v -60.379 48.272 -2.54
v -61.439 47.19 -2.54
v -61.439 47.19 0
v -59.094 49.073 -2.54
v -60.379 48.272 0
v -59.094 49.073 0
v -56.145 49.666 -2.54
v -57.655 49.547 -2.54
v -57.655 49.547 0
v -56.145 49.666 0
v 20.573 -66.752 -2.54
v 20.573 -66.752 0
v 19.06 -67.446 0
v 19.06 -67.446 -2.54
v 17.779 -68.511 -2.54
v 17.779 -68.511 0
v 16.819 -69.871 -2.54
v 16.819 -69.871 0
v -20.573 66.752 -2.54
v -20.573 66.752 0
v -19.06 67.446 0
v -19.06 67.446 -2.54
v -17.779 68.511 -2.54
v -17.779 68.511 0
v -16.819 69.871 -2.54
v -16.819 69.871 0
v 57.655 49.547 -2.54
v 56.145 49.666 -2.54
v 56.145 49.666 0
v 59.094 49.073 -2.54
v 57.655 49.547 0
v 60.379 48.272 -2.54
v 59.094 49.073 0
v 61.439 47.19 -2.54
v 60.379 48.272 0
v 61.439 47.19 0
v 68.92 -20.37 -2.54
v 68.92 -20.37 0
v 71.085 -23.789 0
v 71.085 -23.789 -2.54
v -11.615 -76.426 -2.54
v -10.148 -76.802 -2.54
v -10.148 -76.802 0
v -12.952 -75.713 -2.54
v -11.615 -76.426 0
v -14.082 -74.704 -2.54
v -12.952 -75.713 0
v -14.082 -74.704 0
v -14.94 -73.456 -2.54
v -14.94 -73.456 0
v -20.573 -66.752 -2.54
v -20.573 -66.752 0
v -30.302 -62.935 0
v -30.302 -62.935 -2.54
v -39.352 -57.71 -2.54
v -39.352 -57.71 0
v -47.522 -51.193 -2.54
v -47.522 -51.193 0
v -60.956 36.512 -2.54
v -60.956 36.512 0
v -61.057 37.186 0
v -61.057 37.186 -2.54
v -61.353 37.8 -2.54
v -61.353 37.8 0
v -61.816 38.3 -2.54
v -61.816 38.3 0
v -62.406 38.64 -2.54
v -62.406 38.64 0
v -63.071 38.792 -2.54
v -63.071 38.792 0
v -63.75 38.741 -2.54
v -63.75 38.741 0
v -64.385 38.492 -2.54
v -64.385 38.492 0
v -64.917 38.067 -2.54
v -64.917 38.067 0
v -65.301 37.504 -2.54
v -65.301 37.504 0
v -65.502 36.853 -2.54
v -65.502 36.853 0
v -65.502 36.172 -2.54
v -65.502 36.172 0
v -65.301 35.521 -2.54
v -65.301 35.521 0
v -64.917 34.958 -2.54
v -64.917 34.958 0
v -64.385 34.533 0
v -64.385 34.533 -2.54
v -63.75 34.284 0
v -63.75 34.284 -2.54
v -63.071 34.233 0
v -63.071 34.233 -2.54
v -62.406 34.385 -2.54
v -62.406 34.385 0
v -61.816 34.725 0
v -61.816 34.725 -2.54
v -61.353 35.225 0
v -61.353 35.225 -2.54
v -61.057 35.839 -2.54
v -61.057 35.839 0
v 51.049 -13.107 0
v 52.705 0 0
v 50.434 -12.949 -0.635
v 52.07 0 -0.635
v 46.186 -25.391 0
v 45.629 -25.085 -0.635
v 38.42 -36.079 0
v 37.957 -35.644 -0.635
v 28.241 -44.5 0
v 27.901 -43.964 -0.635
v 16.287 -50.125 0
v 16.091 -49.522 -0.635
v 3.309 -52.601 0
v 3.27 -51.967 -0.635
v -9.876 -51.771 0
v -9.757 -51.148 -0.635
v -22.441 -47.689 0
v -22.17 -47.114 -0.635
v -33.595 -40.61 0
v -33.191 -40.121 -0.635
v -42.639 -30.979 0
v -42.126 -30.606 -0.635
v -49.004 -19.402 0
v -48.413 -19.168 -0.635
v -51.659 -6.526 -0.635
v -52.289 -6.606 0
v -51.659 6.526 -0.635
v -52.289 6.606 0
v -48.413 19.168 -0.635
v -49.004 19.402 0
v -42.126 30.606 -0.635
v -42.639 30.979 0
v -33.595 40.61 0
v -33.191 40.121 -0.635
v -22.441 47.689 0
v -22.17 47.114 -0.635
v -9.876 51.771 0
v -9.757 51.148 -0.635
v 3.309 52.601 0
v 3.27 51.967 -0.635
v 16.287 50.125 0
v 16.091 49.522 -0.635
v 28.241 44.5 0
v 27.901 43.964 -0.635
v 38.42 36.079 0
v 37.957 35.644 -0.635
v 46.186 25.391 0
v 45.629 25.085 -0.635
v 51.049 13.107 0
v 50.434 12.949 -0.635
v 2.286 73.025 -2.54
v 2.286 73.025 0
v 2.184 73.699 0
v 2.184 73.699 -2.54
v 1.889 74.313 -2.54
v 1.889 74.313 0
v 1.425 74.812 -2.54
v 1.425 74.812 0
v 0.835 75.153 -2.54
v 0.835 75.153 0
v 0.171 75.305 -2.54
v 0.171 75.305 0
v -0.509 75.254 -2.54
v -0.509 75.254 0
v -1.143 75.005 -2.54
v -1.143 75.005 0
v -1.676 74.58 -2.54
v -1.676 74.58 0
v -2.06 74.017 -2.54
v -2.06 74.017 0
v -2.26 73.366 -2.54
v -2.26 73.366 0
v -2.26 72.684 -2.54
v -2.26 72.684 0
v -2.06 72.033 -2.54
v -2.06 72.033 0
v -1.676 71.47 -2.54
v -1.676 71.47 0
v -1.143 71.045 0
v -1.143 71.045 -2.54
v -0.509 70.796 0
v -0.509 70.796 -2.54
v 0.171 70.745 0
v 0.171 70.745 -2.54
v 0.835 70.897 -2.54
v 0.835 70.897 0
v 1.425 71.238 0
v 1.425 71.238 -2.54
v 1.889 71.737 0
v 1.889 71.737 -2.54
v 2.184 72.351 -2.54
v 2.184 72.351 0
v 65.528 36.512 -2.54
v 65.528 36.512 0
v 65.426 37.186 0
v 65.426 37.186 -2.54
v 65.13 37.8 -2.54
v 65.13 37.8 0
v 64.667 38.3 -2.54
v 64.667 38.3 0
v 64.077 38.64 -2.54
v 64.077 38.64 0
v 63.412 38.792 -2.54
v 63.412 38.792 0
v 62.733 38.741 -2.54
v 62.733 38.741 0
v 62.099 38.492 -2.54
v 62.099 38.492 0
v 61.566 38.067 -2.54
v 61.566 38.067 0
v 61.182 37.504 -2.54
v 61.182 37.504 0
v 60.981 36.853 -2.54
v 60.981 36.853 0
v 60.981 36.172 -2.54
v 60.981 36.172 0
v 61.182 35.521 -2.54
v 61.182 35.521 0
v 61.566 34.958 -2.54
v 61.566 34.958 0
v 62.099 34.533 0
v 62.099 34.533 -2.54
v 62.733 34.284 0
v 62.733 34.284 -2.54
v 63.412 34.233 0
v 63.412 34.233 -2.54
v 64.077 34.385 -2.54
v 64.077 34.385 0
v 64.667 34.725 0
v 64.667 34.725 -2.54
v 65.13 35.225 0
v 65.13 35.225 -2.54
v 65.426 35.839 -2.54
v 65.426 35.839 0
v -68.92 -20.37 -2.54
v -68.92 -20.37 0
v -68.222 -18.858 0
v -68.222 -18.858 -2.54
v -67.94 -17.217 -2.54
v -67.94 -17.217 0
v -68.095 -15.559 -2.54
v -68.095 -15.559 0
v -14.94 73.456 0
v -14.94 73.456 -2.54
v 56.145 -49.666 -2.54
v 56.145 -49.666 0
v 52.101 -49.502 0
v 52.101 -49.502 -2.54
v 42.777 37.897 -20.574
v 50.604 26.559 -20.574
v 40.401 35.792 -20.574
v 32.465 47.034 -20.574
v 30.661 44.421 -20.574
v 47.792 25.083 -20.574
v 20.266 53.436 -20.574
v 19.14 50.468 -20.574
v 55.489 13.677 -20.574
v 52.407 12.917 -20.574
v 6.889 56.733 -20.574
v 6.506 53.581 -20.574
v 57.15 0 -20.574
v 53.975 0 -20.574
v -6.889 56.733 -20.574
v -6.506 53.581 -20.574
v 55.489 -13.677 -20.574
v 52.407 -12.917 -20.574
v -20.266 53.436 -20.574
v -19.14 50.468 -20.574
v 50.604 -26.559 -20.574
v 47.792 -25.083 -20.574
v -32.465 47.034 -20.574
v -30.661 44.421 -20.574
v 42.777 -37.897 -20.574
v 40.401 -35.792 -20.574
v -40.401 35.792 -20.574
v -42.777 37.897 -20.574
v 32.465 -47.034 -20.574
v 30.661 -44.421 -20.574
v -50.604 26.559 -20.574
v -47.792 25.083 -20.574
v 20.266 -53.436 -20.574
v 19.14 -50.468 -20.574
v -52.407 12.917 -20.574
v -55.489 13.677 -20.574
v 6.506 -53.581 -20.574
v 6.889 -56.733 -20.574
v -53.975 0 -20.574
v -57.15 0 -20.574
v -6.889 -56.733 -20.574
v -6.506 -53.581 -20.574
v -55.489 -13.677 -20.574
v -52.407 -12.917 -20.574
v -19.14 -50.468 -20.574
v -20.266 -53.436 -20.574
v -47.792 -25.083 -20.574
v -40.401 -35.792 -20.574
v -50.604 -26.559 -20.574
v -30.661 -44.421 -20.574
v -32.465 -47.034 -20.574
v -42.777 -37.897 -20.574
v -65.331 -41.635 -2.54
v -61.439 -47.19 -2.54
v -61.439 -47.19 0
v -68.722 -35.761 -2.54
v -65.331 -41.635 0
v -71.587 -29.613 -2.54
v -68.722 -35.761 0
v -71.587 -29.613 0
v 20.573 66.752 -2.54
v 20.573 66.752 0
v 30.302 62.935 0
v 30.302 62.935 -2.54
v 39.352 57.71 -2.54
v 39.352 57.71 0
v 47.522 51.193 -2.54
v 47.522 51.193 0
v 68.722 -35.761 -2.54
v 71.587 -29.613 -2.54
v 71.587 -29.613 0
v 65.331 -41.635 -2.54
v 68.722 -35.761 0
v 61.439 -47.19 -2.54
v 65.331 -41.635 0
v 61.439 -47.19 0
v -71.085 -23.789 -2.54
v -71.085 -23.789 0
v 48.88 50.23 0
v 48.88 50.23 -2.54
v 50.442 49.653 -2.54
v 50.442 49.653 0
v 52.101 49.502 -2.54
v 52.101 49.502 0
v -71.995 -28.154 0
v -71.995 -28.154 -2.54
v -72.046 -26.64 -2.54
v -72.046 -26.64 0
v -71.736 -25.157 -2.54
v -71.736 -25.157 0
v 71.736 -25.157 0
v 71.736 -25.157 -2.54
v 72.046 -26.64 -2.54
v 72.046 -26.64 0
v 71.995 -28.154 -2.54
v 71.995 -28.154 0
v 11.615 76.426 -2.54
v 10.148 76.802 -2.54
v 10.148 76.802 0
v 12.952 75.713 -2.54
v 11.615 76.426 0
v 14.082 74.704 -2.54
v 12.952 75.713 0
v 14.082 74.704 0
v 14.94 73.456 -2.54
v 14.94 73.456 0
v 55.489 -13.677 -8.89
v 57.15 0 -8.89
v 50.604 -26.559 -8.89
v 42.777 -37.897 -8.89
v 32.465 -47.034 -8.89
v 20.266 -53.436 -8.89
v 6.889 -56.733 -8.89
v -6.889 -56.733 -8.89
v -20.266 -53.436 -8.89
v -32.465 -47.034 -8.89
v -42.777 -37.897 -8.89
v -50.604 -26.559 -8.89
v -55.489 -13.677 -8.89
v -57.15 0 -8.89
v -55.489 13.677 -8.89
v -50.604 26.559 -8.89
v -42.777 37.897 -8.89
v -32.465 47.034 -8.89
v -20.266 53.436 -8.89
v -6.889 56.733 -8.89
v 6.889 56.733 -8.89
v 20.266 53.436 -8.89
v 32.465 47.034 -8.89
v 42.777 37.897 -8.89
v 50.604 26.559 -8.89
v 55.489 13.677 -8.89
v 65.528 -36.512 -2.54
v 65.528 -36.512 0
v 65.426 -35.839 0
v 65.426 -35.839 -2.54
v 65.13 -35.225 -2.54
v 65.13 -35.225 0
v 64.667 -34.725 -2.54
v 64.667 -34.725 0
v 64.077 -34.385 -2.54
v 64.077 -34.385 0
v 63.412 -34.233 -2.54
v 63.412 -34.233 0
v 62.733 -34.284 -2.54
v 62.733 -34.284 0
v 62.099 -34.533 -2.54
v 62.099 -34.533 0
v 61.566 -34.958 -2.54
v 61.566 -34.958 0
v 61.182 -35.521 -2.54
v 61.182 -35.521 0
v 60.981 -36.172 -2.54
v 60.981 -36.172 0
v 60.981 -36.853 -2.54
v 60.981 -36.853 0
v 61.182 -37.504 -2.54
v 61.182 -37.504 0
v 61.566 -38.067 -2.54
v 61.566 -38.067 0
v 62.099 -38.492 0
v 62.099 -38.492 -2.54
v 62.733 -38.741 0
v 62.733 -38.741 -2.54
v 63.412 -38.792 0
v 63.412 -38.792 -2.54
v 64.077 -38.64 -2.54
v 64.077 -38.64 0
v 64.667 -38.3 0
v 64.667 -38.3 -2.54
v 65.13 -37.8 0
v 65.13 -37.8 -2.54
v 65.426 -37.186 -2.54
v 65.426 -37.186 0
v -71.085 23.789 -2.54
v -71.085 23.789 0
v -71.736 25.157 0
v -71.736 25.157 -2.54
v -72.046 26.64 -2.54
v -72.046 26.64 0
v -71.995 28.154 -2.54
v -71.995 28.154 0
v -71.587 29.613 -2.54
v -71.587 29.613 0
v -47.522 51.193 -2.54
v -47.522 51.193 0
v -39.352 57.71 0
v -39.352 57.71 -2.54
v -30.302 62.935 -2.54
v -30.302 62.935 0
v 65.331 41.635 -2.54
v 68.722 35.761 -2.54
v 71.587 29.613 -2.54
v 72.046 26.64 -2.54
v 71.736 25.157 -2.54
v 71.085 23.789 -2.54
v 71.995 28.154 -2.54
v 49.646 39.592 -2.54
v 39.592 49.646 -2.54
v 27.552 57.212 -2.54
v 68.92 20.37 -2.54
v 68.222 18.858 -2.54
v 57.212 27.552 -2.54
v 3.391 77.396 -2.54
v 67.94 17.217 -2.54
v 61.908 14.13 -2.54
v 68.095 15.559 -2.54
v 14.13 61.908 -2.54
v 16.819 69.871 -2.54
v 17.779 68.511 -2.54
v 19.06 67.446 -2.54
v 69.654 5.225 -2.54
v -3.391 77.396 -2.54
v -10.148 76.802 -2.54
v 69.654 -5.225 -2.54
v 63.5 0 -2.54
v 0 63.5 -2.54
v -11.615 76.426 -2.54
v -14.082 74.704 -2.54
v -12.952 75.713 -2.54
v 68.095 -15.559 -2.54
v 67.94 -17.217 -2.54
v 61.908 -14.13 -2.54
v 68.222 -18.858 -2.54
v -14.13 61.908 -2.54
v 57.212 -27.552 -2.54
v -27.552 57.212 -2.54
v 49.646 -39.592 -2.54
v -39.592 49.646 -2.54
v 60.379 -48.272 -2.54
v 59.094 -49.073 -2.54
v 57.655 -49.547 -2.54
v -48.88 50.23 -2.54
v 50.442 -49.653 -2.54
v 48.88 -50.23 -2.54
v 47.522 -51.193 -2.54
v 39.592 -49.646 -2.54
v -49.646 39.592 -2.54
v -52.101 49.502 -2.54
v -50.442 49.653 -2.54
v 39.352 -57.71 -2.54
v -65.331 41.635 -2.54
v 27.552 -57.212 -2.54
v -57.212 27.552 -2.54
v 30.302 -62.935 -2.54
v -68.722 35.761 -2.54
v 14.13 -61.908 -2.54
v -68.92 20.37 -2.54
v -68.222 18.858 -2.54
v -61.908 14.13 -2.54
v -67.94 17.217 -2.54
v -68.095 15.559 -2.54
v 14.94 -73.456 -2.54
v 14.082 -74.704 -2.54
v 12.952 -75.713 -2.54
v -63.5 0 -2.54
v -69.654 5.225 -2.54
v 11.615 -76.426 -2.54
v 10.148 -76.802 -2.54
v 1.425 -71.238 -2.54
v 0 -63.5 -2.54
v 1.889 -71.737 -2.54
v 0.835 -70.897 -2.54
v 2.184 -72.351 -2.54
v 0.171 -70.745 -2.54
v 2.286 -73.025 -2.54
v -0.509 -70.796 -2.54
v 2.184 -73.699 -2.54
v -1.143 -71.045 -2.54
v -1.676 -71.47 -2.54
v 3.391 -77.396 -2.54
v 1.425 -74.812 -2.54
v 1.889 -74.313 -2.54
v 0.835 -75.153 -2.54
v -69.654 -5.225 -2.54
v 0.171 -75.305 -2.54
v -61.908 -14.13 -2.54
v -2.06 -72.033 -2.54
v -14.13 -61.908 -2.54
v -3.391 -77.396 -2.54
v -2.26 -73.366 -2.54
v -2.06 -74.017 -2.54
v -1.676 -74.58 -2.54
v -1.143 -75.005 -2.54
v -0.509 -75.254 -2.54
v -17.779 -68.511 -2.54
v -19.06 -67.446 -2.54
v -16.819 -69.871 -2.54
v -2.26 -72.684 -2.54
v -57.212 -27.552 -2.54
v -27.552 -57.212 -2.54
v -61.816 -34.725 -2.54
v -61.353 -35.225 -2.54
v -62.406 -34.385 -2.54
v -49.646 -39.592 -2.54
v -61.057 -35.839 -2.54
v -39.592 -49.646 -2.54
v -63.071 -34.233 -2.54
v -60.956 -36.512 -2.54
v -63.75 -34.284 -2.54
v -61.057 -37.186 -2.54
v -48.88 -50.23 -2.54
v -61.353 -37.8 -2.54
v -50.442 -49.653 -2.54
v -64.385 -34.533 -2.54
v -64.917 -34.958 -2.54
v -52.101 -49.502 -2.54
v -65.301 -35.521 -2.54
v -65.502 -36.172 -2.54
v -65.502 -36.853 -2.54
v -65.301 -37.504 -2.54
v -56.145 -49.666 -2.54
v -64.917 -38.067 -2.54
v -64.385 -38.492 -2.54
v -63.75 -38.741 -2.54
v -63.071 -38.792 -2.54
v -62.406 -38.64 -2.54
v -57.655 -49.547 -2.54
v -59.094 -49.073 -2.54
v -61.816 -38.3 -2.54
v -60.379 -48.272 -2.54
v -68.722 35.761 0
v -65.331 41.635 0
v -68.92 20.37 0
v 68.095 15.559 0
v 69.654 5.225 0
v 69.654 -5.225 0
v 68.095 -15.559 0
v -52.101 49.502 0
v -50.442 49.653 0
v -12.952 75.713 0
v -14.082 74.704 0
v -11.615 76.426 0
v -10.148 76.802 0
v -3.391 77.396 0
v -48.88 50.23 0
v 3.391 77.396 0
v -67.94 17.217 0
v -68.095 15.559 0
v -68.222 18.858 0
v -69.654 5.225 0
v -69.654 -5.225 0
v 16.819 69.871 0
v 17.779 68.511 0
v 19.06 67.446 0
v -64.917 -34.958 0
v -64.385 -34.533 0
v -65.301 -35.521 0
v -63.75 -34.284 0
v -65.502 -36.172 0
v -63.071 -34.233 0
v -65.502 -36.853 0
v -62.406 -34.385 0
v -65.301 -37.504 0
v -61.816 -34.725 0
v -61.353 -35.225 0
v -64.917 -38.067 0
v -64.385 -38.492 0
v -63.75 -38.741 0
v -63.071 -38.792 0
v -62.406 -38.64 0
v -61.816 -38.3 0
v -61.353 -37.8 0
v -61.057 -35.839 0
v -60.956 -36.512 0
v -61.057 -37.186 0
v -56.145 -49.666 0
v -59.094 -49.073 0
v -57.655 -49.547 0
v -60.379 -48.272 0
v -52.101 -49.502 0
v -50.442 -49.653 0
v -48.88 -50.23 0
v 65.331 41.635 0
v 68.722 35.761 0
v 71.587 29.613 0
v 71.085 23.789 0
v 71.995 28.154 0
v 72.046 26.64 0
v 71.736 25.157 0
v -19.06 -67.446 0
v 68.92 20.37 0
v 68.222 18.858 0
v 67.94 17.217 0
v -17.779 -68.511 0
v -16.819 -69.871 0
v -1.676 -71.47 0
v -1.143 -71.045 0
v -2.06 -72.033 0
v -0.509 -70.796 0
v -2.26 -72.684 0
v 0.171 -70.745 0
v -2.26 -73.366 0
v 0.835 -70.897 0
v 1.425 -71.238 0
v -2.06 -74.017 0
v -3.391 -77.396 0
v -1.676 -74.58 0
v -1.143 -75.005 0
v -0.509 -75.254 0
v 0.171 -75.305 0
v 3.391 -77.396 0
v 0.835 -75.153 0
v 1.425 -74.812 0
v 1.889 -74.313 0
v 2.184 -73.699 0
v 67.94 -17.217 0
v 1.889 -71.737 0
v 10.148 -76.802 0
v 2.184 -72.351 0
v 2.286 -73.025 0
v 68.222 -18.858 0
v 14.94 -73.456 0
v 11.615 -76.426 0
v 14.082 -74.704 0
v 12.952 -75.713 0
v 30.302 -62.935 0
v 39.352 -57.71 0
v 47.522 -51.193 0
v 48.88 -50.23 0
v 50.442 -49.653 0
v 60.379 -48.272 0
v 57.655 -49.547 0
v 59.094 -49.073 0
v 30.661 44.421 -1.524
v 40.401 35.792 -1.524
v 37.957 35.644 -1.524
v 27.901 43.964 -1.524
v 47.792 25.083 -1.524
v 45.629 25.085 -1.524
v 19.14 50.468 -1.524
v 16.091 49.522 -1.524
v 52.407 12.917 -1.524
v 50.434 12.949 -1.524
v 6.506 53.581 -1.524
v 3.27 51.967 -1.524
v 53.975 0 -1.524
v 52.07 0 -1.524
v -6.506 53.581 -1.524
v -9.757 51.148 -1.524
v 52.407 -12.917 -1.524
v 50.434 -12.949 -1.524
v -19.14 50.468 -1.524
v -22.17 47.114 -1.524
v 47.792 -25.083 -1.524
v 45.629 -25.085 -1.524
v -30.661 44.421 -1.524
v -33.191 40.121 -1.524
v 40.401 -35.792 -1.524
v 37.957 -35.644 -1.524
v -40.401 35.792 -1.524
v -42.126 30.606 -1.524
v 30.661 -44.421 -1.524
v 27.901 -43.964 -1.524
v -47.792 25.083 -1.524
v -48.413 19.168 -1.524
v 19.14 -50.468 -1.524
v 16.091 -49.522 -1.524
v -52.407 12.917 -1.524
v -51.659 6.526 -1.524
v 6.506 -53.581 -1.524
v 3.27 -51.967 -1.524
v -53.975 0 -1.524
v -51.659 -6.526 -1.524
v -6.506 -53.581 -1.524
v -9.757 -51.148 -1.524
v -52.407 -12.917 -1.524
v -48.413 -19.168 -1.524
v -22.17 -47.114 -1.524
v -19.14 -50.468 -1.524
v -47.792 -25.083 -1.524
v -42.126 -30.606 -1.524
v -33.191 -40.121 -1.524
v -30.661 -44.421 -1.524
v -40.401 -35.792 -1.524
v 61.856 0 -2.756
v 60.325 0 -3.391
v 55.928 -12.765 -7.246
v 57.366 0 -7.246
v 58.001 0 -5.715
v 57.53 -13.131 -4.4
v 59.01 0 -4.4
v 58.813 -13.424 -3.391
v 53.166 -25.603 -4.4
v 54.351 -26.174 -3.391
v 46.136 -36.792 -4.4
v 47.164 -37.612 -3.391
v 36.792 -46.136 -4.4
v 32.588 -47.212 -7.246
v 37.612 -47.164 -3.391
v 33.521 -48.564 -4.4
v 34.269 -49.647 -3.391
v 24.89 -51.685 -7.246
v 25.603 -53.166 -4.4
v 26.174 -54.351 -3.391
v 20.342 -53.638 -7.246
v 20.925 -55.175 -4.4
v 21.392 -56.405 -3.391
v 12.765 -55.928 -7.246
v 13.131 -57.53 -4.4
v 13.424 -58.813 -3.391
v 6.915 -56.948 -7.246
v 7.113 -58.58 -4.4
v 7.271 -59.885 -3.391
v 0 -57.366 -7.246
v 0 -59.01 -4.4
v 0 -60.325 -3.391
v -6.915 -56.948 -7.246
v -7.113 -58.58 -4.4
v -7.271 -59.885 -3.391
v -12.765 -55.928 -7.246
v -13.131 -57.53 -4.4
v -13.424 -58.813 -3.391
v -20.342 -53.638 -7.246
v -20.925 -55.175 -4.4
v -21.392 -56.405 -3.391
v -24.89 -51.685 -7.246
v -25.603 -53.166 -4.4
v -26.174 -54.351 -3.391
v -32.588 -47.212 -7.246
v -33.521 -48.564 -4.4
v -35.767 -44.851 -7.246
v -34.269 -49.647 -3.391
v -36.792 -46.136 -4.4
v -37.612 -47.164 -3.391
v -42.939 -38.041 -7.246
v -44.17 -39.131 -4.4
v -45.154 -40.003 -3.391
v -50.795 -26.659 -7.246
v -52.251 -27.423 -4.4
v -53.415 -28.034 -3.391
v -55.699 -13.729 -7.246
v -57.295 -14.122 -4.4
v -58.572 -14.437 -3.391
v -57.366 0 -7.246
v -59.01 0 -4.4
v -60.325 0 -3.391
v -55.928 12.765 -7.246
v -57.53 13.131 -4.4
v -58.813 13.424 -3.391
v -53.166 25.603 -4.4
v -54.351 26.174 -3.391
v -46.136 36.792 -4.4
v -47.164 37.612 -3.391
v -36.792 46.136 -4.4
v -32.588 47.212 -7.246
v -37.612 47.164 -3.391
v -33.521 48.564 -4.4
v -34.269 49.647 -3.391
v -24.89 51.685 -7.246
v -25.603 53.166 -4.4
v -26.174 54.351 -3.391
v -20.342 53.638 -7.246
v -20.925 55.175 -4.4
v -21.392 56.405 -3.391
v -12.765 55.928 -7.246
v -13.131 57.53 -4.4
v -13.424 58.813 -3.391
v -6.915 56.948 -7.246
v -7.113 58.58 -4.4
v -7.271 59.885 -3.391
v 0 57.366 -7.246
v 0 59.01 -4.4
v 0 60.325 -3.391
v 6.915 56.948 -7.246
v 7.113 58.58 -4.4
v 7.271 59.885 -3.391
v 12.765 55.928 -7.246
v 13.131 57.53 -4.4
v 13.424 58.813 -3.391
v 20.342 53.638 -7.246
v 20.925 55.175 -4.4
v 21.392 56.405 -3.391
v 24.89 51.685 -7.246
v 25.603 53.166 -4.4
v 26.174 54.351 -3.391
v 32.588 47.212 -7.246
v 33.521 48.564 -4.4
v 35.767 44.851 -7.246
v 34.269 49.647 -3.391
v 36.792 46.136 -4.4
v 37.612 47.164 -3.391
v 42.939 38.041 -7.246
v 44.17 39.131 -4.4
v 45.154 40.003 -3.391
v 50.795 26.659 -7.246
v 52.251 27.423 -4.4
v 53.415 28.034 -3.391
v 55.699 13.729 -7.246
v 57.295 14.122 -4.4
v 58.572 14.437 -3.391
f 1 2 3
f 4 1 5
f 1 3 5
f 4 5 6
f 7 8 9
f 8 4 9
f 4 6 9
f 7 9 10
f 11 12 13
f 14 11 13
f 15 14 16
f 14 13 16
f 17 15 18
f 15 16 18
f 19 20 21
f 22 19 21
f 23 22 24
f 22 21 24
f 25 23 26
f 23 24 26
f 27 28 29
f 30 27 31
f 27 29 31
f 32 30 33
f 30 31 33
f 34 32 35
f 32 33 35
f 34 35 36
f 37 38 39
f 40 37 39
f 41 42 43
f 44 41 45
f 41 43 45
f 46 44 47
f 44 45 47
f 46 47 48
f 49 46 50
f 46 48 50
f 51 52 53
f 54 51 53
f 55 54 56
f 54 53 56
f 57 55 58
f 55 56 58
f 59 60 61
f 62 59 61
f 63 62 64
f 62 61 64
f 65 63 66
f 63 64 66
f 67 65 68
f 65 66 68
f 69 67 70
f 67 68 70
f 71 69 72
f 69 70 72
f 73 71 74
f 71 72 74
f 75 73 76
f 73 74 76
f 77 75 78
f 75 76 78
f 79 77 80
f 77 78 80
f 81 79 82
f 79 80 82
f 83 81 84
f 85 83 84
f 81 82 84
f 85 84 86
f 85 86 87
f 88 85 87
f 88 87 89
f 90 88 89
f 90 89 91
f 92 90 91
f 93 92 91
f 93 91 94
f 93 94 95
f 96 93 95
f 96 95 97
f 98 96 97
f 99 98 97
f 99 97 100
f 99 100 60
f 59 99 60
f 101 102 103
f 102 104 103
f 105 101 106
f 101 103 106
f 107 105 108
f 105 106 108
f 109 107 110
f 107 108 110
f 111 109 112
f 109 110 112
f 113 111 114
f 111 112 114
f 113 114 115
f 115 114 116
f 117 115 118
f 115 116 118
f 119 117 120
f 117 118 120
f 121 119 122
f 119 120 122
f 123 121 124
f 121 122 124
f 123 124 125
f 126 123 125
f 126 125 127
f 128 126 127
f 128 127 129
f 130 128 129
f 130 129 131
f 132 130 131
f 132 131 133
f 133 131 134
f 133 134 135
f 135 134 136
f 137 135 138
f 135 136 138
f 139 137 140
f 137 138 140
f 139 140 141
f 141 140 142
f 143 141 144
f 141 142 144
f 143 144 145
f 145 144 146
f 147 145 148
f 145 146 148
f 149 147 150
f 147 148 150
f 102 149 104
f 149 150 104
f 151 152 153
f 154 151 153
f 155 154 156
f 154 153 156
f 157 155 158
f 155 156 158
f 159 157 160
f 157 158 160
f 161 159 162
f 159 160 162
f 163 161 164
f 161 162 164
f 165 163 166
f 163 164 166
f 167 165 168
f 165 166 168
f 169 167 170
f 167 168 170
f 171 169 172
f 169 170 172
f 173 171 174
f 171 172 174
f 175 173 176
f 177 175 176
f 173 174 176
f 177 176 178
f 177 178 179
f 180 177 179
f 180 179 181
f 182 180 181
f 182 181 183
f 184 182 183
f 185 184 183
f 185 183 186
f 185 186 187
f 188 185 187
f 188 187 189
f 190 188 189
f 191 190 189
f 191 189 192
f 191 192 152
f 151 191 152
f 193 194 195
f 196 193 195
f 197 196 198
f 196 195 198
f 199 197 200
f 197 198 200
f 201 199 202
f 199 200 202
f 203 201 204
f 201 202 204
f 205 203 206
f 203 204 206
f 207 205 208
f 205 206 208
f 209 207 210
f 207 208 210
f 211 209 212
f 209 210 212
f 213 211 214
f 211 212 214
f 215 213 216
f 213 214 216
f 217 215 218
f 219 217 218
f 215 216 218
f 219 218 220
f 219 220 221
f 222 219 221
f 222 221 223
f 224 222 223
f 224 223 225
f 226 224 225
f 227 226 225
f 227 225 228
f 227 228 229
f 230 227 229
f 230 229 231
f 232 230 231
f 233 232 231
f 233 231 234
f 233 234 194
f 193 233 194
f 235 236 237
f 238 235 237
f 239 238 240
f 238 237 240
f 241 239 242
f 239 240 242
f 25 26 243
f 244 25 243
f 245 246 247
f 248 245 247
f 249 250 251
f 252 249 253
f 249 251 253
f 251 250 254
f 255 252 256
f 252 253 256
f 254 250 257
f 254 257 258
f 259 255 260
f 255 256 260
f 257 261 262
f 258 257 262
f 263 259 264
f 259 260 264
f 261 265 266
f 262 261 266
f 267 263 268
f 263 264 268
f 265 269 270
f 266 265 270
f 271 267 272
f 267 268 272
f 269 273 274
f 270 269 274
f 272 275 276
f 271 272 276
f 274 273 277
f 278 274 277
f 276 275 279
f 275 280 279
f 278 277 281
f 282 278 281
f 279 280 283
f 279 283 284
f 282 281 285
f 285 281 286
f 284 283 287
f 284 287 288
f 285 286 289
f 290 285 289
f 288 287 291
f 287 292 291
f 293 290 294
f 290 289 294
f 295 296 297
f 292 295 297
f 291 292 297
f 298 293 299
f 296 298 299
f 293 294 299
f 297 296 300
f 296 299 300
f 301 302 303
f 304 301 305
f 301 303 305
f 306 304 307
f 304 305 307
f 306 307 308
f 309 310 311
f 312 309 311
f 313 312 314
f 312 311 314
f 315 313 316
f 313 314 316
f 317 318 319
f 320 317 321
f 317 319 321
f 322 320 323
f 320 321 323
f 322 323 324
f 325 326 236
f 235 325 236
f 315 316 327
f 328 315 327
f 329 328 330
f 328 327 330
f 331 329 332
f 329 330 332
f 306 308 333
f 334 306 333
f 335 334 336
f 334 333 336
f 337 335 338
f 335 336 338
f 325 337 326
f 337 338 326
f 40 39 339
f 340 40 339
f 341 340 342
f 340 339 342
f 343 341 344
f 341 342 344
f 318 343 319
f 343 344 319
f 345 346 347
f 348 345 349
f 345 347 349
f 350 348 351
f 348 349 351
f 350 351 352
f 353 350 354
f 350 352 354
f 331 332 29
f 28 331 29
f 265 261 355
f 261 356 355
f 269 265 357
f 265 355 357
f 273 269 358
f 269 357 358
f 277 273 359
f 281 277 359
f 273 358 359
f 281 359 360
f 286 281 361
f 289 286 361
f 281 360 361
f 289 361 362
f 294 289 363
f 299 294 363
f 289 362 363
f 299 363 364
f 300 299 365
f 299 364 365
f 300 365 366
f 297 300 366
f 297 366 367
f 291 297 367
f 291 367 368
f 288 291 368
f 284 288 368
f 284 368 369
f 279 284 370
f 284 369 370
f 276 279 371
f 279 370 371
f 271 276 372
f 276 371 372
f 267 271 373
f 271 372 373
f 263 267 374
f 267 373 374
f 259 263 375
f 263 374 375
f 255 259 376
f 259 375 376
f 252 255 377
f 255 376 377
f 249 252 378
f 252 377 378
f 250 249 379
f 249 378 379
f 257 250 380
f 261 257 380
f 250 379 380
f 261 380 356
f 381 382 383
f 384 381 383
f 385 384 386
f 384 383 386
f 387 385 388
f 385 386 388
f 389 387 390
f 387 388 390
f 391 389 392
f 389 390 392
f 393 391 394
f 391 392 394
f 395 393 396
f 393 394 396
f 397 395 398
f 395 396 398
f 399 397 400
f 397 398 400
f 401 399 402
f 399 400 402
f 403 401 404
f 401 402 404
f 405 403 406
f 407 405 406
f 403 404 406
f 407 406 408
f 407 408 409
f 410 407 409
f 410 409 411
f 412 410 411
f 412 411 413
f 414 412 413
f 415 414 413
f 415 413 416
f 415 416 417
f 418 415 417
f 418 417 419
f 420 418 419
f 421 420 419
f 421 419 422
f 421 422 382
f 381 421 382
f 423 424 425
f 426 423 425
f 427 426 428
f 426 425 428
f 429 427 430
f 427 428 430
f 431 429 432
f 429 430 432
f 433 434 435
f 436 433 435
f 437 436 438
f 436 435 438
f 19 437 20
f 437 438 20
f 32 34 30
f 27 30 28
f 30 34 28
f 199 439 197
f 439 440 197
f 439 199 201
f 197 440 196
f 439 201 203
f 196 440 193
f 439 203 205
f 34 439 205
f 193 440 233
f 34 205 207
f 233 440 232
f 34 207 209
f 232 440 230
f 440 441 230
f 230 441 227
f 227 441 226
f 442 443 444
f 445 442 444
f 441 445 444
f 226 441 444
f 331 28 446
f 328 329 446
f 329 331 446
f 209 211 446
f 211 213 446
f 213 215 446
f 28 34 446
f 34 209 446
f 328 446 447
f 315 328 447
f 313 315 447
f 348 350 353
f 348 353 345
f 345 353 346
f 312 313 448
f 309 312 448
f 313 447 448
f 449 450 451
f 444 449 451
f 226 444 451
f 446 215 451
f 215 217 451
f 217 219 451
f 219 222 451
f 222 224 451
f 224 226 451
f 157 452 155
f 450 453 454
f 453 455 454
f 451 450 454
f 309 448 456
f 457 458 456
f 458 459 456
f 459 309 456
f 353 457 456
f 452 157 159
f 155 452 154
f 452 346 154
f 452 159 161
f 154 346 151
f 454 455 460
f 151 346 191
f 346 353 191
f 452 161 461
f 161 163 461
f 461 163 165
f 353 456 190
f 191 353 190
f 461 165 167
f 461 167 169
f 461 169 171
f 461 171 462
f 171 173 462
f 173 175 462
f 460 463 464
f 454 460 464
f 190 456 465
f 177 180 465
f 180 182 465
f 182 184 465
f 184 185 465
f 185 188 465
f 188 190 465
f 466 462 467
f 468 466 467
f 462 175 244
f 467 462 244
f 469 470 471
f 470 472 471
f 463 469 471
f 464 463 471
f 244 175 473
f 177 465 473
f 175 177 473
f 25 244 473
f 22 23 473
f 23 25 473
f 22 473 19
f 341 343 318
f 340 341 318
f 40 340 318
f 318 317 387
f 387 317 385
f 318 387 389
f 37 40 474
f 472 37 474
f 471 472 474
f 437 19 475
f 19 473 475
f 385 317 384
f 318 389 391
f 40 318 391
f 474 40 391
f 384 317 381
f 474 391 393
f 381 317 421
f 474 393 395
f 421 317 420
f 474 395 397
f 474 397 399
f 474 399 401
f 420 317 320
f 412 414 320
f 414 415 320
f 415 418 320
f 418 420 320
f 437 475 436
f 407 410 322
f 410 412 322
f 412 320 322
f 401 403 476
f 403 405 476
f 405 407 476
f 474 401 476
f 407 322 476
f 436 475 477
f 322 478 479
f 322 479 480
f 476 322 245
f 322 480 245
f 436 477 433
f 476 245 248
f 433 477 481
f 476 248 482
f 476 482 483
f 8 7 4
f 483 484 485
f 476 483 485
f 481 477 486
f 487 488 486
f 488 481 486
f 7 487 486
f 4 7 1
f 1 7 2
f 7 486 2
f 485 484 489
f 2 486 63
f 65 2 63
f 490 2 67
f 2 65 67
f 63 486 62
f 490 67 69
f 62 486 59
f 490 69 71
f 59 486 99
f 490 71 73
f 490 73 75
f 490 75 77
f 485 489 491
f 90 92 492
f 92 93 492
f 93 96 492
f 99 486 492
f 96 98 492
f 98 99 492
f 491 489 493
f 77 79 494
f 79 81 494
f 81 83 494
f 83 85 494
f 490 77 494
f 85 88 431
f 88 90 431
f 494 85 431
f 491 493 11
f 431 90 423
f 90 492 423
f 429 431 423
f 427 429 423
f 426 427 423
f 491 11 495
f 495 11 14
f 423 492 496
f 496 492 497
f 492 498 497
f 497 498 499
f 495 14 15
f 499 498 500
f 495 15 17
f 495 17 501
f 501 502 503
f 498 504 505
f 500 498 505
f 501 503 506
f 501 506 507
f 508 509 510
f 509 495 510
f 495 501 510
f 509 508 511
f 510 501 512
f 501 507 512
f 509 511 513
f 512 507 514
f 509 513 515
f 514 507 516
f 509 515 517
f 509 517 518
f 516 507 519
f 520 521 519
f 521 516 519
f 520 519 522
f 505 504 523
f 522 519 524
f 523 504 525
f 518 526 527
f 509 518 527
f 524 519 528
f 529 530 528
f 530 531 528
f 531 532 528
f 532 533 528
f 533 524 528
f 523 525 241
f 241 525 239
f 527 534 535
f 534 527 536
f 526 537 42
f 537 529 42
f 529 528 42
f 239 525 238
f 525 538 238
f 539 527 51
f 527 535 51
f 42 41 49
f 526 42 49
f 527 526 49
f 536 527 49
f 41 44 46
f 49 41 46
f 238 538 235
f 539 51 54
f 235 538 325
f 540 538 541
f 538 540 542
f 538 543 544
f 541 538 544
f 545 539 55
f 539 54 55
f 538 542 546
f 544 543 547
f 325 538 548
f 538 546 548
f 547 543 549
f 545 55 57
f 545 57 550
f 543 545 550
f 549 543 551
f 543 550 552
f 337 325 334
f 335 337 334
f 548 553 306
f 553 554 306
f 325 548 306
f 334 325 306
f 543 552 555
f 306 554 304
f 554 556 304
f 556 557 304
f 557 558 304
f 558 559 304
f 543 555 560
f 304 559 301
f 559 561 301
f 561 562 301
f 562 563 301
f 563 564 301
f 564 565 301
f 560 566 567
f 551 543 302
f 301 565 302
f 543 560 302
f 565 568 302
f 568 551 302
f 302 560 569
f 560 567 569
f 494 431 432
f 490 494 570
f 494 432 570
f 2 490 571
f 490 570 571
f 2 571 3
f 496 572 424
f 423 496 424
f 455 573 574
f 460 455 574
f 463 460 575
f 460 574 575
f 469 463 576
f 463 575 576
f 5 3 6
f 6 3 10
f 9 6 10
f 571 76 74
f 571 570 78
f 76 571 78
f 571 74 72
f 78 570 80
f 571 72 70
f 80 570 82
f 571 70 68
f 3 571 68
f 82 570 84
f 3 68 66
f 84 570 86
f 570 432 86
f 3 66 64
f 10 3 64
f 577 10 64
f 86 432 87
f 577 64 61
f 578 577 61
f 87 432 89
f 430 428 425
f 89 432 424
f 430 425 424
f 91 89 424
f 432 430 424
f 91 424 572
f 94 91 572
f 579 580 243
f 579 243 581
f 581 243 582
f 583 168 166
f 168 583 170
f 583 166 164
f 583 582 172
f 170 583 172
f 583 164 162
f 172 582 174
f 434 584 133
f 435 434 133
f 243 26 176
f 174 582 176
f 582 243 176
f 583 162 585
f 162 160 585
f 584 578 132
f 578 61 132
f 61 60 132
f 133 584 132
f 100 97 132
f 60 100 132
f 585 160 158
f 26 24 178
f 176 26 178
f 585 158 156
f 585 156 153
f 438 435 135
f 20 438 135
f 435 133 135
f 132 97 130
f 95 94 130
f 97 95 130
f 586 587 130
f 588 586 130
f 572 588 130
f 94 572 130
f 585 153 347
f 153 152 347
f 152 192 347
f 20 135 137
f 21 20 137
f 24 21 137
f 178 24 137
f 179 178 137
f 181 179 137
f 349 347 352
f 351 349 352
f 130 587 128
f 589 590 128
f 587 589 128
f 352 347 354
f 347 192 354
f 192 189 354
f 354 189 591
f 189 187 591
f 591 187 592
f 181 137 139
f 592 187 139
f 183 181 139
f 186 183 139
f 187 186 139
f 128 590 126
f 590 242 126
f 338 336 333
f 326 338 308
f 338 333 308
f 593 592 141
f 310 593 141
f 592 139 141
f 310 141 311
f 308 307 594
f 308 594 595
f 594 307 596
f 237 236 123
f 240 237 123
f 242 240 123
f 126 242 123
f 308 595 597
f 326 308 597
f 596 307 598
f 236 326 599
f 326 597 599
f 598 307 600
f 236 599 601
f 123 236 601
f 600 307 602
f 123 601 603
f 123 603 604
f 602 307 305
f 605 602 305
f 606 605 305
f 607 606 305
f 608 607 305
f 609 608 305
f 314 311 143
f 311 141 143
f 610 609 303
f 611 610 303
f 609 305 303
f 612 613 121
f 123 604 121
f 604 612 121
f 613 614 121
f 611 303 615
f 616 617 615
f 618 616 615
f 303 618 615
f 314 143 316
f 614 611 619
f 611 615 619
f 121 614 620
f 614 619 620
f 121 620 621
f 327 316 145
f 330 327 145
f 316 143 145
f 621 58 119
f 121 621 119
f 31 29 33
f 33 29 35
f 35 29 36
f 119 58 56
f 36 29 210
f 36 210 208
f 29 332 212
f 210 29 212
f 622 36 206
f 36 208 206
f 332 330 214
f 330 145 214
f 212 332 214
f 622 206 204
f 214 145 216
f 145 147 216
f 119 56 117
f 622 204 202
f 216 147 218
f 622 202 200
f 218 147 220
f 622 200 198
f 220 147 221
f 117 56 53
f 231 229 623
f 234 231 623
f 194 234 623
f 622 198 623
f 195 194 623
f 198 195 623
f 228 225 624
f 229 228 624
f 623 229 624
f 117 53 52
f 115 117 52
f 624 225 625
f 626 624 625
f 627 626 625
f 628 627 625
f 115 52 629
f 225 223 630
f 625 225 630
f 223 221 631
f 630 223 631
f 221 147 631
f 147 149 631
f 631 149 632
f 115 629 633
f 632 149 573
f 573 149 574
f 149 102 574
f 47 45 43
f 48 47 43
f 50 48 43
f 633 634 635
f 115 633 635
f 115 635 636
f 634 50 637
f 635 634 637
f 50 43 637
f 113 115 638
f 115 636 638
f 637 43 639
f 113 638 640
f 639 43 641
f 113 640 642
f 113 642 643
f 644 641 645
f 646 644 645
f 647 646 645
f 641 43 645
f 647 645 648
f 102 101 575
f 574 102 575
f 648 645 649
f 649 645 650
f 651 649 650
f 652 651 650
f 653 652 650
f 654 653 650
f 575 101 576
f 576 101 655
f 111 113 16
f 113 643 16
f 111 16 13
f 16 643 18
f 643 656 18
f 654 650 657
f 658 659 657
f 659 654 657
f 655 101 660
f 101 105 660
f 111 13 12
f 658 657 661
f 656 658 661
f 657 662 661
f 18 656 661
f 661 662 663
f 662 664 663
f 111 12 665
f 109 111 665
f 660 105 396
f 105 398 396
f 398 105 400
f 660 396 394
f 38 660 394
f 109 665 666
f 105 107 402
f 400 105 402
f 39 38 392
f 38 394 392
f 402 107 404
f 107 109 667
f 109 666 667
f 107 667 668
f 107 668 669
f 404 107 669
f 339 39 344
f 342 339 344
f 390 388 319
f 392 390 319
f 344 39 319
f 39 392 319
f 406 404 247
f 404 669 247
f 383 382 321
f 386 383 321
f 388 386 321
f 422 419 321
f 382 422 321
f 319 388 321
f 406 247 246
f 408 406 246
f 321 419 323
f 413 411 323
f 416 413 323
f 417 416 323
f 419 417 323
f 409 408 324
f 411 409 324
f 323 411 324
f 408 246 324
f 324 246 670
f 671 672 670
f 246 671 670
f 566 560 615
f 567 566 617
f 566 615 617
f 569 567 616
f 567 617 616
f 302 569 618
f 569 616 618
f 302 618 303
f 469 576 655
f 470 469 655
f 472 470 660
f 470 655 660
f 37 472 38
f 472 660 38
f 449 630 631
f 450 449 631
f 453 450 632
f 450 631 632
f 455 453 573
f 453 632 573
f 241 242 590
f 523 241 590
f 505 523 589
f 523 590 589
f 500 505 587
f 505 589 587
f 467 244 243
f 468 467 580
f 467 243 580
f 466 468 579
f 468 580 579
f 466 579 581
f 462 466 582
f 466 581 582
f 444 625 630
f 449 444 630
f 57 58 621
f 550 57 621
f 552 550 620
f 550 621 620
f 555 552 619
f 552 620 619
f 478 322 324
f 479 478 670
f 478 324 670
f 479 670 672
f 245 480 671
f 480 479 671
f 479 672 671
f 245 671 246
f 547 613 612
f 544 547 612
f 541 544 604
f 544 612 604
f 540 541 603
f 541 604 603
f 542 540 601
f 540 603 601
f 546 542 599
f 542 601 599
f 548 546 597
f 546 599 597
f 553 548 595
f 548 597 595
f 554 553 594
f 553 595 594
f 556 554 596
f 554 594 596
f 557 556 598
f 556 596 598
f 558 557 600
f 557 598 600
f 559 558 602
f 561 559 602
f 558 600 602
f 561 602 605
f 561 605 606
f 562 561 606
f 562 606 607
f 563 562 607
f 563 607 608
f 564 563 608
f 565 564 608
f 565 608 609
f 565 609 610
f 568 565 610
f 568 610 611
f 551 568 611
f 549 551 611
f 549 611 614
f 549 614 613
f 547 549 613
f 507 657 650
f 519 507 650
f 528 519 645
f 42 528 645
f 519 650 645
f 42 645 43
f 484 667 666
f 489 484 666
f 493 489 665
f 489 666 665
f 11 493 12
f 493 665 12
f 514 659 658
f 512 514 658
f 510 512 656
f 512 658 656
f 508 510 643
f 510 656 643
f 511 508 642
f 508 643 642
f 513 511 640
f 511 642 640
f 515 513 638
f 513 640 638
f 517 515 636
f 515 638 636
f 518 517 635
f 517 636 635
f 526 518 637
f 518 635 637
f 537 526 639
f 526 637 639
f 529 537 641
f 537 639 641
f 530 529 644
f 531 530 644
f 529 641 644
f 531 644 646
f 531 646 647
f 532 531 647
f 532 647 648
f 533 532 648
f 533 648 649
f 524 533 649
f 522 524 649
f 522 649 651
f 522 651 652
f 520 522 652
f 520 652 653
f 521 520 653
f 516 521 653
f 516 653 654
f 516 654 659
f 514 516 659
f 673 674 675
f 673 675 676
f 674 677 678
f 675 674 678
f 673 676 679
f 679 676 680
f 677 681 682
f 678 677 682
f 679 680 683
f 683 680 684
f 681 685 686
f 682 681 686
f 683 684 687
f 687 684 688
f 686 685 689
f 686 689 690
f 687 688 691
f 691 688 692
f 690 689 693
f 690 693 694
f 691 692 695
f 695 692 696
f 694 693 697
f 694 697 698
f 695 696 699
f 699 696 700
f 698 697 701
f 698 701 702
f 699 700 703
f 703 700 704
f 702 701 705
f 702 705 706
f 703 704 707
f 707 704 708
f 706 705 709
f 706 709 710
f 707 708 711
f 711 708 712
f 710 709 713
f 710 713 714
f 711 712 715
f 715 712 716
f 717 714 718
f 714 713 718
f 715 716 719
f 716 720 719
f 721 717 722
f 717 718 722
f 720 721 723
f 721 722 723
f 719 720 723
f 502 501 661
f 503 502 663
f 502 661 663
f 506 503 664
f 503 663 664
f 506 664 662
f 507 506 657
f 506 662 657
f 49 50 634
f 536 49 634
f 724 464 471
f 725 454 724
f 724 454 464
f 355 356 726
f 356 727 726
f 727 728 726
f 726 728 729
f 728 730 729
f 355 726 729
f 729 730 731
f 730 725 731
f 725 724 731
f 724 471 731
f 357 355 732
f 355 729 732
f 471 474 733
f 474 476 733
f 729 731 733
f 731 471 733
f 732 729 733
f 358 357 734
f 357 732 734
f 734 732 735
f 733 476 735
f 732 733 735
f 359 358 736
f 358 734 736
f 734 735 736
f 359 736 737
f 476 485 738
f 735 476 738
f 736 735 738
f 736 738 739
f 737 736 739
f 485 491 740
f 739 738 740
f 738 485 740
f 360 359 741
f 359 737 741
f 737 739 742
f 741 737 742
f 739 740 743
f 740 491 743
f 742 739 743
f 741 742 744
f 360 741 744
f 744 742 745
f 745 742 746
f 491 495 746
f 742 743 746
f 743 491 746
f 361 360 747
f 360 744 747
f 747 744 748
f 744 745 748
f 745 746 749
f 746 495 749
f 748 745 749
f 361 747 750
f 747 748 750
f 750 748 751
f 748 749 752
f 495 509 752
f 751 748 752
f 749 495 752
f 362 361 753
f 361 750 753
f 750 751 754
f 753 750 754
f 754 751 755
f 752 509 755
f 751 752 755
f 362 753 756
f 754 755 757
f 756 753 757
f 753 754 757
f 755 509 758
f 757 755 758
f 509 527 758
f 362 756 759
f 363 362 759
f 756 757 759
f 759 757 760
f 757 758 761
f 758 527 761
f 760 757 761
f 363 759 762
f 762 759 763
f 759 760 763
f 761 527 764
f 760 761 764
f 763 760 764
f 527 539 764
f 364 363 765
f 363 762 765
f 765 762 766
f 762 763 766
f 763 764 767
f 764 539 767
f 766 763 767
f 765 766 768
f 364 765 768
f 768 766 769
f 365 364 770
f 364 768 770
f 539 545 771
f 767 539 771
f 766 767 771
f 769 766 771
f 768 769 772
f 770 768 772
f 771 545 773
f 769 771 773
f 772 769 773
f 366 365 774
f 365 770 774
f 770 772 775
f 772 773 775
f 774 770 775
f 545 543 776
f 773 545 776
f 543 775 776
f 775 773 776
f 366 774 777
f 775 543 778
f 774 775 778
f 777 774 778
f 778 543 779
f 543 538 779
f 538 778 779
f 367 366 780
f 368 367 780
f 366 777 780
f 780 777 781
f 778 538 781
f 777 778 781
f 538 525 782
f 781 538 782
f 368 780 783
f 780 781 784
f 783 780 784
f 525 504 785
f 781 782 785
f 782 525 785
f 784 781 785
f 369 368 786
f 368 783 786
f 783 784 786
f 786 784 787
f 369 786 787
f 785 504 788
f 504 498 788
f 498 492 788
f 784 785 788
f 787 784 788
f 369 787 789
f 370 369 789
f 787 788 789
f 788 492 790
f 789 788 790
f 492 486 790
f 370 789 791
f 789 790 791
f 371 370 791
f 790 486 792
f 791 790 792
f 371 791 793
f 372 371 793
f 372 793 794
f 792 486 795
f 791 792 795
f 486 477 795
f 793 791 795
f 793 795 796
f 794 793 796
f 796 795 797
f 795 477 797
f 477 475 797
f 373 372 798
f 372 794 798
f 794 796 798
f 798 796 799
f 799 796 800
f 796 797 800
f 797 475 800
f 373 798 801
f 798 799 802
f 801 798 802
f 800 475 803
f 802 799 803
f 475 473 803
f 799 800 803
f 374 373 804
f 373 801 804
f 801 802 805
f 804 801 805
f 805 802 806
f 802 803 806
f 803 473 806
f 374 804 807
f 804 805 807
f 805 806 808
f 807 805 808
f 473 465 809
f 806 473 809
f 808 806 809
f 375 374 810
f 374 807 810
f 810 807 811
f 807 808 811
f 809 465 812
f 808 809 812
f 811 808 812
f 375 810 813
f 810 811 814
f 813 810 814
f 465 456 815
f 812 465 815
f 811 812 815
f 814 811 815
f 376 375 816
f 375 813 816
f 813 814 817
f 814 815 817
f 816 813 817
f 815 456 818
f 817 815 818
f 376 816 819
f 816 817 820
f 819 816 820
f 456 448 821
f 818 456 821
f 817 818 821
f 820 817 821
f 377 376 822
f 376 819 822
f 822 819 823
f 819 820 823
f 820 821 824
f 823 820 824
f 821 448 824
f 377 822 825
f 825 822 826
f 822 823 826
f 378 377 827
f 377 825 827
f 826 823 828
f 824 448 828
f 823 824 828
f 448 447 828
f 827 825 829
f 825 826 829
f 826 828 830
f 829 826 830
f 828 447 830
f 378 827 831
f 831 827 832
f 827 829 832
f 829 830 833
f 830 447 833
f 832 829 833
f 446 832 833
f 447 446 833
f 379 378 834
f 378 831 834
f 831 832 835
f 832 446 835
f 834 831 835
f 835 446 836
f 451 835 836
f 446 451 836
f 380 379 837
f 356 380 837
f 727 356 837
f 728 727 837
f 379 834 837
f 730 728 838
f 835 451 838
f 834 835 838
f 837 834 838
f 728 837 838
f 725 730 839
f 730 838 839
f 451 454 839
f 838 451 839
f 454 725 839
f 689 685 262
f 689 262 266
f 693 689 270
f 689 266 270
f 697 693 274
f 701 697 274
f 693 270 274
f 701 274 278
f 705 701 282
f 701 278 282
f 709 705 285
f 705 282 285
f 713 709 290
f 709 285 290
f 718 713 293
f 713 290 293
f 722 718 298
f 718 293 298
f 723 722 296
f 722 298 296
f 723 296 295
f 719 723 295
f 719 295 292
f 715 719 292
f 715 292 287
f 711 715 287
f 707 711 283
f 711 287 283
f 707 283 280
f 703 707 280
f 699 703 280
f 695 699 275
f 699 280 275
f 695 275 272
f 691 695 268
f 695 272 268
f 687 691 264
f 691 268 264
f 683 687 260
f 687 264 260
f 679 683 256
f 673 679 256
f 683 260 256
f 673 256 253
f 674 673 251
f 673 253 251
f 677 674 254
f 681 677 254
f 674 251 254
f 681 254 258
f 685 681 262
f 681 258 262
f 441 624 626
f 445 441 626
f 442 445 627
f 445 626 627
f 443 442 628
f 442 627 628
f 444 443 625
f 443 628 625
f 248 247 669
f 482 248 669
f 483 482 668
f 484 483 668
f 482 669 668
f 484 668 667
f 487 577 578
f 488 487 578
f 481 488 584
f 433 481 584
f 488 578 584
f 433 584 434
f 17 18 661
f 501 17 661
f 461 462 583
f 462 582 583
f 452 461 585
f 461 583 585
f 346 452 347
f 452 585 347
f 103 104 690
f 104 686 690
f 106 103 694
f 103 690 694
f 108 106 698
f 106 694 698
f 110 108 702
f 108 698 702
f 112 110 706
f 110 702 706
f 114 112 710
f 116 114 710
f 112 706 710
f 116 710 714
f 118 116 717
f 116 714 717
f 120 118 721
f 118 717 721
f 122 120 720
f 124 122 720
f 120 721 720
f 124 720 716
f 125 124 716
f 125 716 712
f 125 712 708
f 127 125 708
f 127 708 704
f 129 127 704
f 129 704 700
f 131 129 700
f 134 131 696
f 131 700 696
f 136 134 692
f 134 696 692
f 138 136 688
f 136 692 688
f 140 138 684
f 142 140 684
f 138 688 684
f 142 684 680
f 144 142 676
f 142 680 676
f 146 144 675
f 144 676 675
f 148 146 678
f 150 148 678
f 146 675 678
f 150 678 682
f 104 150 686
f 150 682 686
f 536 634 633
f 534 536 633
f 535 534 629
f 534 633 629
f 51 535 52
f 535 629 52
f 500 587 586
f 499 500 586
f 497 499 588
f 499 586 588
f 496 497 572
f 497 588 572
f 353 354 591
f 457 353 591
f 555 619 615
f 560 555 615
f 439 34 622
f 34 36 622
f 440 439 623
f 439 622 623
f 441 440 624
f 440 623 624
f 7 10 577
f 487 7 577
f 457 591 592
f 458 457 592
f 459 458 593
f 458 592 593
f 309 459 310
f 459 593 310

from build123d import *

# Parameters (mm, degrees)
SKETCH4_R          = 2.286
CUT_EXTRUDE1_DEPTH = 112.474173134


with BuildPart() as part:
    # Sketch3 → Revolve1 (revolve)
    with BuildSketch(Plane(origin=(0, 0, 0), x_dir=(0, 0, -1), z_dir=(1, 0, 0)), mode=Mode.PRIVATE) as revolve1_sk:
        with BuildLine():
            Line((0, 77.47), (0, 52.705))
            Line((0, 52.705), (0.635, 52.07))
            Line((0.635, 52.07), (1.524, 52.07))
            Line((1.524, 52.07), (1.524, 53.975))
            Line((1.524, 53.975), (20.574, 53.975))
            Line((20.574, 53.975), (20.574, 57.15))
            Line((20.574, 57.15), (8.89, 57.15))
            ThreePointArc((8.89, 57.15), (4.399871939, 59.009871939), (2.54, 63.5))
            Line((2.54, 63.5), (2.54, 77.47))
            Line((2.54, 77.47), (0, 77.47))
        make_face()
    revolve(revolve1_sk.sketch.rotate(Axis((0, 0, 0), (0, 0, -1)), 90), axis=Axis((0, 0, 0), (0, 0, -1)))

    # Sketch4 → Cut-Extrude1 (cut, through all)
    with BuildSketch(Plane.XY):
        with BuildLine():
            ThreePointArc((10.148016689, 76.802465177), (12.952013431, 75.713278366), (14.940104183, 73.455797294))
            Line((14.940104183, 73.455797294), (16.819480806, 69.871264453))
            ThreePointArc((16.819480806, 69.871264453), (18.384579854, 67.936367662), (20.573091868, 66.751557218))
            ThreePointArc((20.573091868, 66.751557218), (34.925, 60.491874454), (47.521998359, 51.192598801))
            ThreePointArc((47.521998359, 51.192598801), (49.642330309, 49.889697022), (52.100549608, 49.501729883))
            Line((52.100549608, 49.501729883), (56.14453442, 49.666408405))
            ThreePointArc((56.14453442, 49.666408405), (59.093615754, 49.073411844), (61.438877572, 47.189672839))
            ThreePointArc((61.438877572, 47.189672839), (38.735, 67.090988031), (10.148016689, 76.802465177))
        make_face()
        with BuildLine():
            ThreePointArc((-14.940104183, 73.455797294), (-12.952013431, 75.713278366), (-10.148016689, 76.802465177))
            ThreePointArc((-10.148016689, 76.802465177), (-38.735, 67.090988031), (-61.438877572, 47.189672839))
            ThreePointArc((-61.438877572, 47.189672839), (-59.093615754, 49.073411844), (-56.14453442, 49.666408405))
            Line((-56.14453442, 49.666408405), (-52.100549608, 49.501729883))
            ThreePointArc((-52.100549608, 49.501729883), (-49.642330309, 49.889697022), (-47.521998359, 51.192598801))
            ThreePointArc((-47.521998359, 51.192598801), (-34.925, 60.491874454), (-20.573091868, 66.751557218))
            ThreePointArc((-20.573091868, 66.751557218), (-18.384579854, 67.936367662), (-16.819480806, 69.871264453))
            Line((-16.819480806, 69.871264453), (-14.940104183, 73.455797294))
        make_face()
        with BuildLine():
            ThreePointArc((71.586894261, -29.612792338), (77.47, 0), (71.586894261, 29.612792338))
            ThreePointArc((71.586894261, 29.612792338), (72.045629184, 26.639866522), (71.084638604, 23.789388889))
            Line((71.084638604, 23.789388889), (68.920030414, 20.36953457))
            ThreePointArc((68.920030414, 20.36953457), (68.026910163, 18.04667064), (68.095090227, 15.558958417))
            ThreePointArc((68.095090227, 15.558958417), (69.85, 0), (68.095090227, -15.558958417))
            ThreePointArc((68.095090227, -15.558958417), (68.026910163, -18.04667064), (68.920030414, -20.36953457))
            Line((68.920030414, -20.36953457), (71.084638604, -23.789388889))
            ThreePointArc((71.084638604, -23.789388889), (72.045629184, -26.639866522), (71.586894261, -29.612792338))
        make_face()
        with BuildLine():
            ThreePointArc((-71.084638604, 23.789388889), (-72.045629184, 26.639866522), (-71.586894261, 29.612792338))
            ThreePointArc((-71.586894261, 29.612792338), (-77.47, 0), (-71.586894261, -29.612792338))
            ThreePointArc((-71.586894261, -29.612792338), (-72.045629184, -26.639866522), (-71.084638604, -23.789388889))
            Line((-71.084638604, -23.789388889), (-68.920030414, -20.36953457))
            ThreePointArc((-68.920030414, -20.36953457), (-68.026910163, -18.04667064), (-68.095090227, -15.558958417))
            ThreePointArc((-68.095090227, -15.558958417), (-69.85, 0), (-68.095090227, 15.558958417))
            ThreePointArc((-68.095090227, 15.558958417), (-68.026910163, 18.04667064), (-68.920030414, 20.36953457))
            Line((-68.920030414, 20.36953457), (-71.084638604, 23.789388889))
        make_face()
        with BuildLine():
            ThreePointArc((10.148016689, -76.802465177), (38.735, -67.090988031), (61.438877572, -47.189672839))
            ThreePointArc((61.438877572, -47.189672839), (59.093615754, -49.073411844), (56.14453442, -49.666408405))
            Line((56.14453442, -49.666408405), (52.100549608, -49.501729883))
            ThreePointArc((52.100549608, -49.501729883), (49.642330309, -49.889697022), (47.521998359, -51.192598801))
            ThreePointArc((47.521998359, -51.192598801), (34.925, -60.491874454), (20.573091868, -66.751557218))
            ThreePointArc((20.573091868, -66.751557218), (18.384579854, -67.936367662), (16.819480806, -69.871264453))
            Line((16.819480806, -69.871264453), (14.940104183, -73.455797294))
            ThreePointArc((14.940104183, -73.455797294), (12.952013431, -75.713278366), (10.148016689, -76.802465177))
        make_face()
        with BuildLine():
            ThreePointArc((-56.14453442, -49.666408405), (-59.093615754, -49.073411844), (-61.438877572, -47.189672839))
            ThreePointArc((-61.438877572, -47.189672839), (-38.735, -67.090988031), (-10.148016689, -76.802465177))
            ThreePointArc((-10.148016689, -76.802465177), (-12.952013431, -75.713278366), (-14.940104183, -73.455797294))
            Line((-14.940104183, -73.455797294), (-16.819480806, -69.871264453))
            ThreePointArc((-16.819480806, -69.871264453), (-18.384579854, -67.936367662), (-20.573091868, -66.751557218))
            ThreePointArc((-20.573091868, -66.751557218), (-34.925, -60.491874454), (-47.521998359, -51.192598801))
            ThreePointArc((-47.521998359, -51.192598801), (-49.642330309, -49.889697022), (-52.100549608, -49.501729883))
            Line((-52.100549608, -49.501729883), (-56.14453442, -49.666408405))
        make_face()
        with Locations((0, 73.025)):
            Circle(SKETCH4_R)
        with Locations((63.241505111, 36.5125)):
            Circle(SKETCH4_R)
        with Locations((63.241505111, -36.5125)):
            Circle(SKETCH4_R)
        with Locations((0, -73.025)):
            Circle(SKETCH4_R)
        with Locations((-63.241505111, -36.5125)):
            Circle(SKETCH4_R)
        with Locations((-63.241505111, 36.5125)):
            Circle(SKETCH4_R)
    extrude(amount=-CUT_EXTRUDE1_DEPTH, mode=Mode.SUBTRACT)


solid = part.part
